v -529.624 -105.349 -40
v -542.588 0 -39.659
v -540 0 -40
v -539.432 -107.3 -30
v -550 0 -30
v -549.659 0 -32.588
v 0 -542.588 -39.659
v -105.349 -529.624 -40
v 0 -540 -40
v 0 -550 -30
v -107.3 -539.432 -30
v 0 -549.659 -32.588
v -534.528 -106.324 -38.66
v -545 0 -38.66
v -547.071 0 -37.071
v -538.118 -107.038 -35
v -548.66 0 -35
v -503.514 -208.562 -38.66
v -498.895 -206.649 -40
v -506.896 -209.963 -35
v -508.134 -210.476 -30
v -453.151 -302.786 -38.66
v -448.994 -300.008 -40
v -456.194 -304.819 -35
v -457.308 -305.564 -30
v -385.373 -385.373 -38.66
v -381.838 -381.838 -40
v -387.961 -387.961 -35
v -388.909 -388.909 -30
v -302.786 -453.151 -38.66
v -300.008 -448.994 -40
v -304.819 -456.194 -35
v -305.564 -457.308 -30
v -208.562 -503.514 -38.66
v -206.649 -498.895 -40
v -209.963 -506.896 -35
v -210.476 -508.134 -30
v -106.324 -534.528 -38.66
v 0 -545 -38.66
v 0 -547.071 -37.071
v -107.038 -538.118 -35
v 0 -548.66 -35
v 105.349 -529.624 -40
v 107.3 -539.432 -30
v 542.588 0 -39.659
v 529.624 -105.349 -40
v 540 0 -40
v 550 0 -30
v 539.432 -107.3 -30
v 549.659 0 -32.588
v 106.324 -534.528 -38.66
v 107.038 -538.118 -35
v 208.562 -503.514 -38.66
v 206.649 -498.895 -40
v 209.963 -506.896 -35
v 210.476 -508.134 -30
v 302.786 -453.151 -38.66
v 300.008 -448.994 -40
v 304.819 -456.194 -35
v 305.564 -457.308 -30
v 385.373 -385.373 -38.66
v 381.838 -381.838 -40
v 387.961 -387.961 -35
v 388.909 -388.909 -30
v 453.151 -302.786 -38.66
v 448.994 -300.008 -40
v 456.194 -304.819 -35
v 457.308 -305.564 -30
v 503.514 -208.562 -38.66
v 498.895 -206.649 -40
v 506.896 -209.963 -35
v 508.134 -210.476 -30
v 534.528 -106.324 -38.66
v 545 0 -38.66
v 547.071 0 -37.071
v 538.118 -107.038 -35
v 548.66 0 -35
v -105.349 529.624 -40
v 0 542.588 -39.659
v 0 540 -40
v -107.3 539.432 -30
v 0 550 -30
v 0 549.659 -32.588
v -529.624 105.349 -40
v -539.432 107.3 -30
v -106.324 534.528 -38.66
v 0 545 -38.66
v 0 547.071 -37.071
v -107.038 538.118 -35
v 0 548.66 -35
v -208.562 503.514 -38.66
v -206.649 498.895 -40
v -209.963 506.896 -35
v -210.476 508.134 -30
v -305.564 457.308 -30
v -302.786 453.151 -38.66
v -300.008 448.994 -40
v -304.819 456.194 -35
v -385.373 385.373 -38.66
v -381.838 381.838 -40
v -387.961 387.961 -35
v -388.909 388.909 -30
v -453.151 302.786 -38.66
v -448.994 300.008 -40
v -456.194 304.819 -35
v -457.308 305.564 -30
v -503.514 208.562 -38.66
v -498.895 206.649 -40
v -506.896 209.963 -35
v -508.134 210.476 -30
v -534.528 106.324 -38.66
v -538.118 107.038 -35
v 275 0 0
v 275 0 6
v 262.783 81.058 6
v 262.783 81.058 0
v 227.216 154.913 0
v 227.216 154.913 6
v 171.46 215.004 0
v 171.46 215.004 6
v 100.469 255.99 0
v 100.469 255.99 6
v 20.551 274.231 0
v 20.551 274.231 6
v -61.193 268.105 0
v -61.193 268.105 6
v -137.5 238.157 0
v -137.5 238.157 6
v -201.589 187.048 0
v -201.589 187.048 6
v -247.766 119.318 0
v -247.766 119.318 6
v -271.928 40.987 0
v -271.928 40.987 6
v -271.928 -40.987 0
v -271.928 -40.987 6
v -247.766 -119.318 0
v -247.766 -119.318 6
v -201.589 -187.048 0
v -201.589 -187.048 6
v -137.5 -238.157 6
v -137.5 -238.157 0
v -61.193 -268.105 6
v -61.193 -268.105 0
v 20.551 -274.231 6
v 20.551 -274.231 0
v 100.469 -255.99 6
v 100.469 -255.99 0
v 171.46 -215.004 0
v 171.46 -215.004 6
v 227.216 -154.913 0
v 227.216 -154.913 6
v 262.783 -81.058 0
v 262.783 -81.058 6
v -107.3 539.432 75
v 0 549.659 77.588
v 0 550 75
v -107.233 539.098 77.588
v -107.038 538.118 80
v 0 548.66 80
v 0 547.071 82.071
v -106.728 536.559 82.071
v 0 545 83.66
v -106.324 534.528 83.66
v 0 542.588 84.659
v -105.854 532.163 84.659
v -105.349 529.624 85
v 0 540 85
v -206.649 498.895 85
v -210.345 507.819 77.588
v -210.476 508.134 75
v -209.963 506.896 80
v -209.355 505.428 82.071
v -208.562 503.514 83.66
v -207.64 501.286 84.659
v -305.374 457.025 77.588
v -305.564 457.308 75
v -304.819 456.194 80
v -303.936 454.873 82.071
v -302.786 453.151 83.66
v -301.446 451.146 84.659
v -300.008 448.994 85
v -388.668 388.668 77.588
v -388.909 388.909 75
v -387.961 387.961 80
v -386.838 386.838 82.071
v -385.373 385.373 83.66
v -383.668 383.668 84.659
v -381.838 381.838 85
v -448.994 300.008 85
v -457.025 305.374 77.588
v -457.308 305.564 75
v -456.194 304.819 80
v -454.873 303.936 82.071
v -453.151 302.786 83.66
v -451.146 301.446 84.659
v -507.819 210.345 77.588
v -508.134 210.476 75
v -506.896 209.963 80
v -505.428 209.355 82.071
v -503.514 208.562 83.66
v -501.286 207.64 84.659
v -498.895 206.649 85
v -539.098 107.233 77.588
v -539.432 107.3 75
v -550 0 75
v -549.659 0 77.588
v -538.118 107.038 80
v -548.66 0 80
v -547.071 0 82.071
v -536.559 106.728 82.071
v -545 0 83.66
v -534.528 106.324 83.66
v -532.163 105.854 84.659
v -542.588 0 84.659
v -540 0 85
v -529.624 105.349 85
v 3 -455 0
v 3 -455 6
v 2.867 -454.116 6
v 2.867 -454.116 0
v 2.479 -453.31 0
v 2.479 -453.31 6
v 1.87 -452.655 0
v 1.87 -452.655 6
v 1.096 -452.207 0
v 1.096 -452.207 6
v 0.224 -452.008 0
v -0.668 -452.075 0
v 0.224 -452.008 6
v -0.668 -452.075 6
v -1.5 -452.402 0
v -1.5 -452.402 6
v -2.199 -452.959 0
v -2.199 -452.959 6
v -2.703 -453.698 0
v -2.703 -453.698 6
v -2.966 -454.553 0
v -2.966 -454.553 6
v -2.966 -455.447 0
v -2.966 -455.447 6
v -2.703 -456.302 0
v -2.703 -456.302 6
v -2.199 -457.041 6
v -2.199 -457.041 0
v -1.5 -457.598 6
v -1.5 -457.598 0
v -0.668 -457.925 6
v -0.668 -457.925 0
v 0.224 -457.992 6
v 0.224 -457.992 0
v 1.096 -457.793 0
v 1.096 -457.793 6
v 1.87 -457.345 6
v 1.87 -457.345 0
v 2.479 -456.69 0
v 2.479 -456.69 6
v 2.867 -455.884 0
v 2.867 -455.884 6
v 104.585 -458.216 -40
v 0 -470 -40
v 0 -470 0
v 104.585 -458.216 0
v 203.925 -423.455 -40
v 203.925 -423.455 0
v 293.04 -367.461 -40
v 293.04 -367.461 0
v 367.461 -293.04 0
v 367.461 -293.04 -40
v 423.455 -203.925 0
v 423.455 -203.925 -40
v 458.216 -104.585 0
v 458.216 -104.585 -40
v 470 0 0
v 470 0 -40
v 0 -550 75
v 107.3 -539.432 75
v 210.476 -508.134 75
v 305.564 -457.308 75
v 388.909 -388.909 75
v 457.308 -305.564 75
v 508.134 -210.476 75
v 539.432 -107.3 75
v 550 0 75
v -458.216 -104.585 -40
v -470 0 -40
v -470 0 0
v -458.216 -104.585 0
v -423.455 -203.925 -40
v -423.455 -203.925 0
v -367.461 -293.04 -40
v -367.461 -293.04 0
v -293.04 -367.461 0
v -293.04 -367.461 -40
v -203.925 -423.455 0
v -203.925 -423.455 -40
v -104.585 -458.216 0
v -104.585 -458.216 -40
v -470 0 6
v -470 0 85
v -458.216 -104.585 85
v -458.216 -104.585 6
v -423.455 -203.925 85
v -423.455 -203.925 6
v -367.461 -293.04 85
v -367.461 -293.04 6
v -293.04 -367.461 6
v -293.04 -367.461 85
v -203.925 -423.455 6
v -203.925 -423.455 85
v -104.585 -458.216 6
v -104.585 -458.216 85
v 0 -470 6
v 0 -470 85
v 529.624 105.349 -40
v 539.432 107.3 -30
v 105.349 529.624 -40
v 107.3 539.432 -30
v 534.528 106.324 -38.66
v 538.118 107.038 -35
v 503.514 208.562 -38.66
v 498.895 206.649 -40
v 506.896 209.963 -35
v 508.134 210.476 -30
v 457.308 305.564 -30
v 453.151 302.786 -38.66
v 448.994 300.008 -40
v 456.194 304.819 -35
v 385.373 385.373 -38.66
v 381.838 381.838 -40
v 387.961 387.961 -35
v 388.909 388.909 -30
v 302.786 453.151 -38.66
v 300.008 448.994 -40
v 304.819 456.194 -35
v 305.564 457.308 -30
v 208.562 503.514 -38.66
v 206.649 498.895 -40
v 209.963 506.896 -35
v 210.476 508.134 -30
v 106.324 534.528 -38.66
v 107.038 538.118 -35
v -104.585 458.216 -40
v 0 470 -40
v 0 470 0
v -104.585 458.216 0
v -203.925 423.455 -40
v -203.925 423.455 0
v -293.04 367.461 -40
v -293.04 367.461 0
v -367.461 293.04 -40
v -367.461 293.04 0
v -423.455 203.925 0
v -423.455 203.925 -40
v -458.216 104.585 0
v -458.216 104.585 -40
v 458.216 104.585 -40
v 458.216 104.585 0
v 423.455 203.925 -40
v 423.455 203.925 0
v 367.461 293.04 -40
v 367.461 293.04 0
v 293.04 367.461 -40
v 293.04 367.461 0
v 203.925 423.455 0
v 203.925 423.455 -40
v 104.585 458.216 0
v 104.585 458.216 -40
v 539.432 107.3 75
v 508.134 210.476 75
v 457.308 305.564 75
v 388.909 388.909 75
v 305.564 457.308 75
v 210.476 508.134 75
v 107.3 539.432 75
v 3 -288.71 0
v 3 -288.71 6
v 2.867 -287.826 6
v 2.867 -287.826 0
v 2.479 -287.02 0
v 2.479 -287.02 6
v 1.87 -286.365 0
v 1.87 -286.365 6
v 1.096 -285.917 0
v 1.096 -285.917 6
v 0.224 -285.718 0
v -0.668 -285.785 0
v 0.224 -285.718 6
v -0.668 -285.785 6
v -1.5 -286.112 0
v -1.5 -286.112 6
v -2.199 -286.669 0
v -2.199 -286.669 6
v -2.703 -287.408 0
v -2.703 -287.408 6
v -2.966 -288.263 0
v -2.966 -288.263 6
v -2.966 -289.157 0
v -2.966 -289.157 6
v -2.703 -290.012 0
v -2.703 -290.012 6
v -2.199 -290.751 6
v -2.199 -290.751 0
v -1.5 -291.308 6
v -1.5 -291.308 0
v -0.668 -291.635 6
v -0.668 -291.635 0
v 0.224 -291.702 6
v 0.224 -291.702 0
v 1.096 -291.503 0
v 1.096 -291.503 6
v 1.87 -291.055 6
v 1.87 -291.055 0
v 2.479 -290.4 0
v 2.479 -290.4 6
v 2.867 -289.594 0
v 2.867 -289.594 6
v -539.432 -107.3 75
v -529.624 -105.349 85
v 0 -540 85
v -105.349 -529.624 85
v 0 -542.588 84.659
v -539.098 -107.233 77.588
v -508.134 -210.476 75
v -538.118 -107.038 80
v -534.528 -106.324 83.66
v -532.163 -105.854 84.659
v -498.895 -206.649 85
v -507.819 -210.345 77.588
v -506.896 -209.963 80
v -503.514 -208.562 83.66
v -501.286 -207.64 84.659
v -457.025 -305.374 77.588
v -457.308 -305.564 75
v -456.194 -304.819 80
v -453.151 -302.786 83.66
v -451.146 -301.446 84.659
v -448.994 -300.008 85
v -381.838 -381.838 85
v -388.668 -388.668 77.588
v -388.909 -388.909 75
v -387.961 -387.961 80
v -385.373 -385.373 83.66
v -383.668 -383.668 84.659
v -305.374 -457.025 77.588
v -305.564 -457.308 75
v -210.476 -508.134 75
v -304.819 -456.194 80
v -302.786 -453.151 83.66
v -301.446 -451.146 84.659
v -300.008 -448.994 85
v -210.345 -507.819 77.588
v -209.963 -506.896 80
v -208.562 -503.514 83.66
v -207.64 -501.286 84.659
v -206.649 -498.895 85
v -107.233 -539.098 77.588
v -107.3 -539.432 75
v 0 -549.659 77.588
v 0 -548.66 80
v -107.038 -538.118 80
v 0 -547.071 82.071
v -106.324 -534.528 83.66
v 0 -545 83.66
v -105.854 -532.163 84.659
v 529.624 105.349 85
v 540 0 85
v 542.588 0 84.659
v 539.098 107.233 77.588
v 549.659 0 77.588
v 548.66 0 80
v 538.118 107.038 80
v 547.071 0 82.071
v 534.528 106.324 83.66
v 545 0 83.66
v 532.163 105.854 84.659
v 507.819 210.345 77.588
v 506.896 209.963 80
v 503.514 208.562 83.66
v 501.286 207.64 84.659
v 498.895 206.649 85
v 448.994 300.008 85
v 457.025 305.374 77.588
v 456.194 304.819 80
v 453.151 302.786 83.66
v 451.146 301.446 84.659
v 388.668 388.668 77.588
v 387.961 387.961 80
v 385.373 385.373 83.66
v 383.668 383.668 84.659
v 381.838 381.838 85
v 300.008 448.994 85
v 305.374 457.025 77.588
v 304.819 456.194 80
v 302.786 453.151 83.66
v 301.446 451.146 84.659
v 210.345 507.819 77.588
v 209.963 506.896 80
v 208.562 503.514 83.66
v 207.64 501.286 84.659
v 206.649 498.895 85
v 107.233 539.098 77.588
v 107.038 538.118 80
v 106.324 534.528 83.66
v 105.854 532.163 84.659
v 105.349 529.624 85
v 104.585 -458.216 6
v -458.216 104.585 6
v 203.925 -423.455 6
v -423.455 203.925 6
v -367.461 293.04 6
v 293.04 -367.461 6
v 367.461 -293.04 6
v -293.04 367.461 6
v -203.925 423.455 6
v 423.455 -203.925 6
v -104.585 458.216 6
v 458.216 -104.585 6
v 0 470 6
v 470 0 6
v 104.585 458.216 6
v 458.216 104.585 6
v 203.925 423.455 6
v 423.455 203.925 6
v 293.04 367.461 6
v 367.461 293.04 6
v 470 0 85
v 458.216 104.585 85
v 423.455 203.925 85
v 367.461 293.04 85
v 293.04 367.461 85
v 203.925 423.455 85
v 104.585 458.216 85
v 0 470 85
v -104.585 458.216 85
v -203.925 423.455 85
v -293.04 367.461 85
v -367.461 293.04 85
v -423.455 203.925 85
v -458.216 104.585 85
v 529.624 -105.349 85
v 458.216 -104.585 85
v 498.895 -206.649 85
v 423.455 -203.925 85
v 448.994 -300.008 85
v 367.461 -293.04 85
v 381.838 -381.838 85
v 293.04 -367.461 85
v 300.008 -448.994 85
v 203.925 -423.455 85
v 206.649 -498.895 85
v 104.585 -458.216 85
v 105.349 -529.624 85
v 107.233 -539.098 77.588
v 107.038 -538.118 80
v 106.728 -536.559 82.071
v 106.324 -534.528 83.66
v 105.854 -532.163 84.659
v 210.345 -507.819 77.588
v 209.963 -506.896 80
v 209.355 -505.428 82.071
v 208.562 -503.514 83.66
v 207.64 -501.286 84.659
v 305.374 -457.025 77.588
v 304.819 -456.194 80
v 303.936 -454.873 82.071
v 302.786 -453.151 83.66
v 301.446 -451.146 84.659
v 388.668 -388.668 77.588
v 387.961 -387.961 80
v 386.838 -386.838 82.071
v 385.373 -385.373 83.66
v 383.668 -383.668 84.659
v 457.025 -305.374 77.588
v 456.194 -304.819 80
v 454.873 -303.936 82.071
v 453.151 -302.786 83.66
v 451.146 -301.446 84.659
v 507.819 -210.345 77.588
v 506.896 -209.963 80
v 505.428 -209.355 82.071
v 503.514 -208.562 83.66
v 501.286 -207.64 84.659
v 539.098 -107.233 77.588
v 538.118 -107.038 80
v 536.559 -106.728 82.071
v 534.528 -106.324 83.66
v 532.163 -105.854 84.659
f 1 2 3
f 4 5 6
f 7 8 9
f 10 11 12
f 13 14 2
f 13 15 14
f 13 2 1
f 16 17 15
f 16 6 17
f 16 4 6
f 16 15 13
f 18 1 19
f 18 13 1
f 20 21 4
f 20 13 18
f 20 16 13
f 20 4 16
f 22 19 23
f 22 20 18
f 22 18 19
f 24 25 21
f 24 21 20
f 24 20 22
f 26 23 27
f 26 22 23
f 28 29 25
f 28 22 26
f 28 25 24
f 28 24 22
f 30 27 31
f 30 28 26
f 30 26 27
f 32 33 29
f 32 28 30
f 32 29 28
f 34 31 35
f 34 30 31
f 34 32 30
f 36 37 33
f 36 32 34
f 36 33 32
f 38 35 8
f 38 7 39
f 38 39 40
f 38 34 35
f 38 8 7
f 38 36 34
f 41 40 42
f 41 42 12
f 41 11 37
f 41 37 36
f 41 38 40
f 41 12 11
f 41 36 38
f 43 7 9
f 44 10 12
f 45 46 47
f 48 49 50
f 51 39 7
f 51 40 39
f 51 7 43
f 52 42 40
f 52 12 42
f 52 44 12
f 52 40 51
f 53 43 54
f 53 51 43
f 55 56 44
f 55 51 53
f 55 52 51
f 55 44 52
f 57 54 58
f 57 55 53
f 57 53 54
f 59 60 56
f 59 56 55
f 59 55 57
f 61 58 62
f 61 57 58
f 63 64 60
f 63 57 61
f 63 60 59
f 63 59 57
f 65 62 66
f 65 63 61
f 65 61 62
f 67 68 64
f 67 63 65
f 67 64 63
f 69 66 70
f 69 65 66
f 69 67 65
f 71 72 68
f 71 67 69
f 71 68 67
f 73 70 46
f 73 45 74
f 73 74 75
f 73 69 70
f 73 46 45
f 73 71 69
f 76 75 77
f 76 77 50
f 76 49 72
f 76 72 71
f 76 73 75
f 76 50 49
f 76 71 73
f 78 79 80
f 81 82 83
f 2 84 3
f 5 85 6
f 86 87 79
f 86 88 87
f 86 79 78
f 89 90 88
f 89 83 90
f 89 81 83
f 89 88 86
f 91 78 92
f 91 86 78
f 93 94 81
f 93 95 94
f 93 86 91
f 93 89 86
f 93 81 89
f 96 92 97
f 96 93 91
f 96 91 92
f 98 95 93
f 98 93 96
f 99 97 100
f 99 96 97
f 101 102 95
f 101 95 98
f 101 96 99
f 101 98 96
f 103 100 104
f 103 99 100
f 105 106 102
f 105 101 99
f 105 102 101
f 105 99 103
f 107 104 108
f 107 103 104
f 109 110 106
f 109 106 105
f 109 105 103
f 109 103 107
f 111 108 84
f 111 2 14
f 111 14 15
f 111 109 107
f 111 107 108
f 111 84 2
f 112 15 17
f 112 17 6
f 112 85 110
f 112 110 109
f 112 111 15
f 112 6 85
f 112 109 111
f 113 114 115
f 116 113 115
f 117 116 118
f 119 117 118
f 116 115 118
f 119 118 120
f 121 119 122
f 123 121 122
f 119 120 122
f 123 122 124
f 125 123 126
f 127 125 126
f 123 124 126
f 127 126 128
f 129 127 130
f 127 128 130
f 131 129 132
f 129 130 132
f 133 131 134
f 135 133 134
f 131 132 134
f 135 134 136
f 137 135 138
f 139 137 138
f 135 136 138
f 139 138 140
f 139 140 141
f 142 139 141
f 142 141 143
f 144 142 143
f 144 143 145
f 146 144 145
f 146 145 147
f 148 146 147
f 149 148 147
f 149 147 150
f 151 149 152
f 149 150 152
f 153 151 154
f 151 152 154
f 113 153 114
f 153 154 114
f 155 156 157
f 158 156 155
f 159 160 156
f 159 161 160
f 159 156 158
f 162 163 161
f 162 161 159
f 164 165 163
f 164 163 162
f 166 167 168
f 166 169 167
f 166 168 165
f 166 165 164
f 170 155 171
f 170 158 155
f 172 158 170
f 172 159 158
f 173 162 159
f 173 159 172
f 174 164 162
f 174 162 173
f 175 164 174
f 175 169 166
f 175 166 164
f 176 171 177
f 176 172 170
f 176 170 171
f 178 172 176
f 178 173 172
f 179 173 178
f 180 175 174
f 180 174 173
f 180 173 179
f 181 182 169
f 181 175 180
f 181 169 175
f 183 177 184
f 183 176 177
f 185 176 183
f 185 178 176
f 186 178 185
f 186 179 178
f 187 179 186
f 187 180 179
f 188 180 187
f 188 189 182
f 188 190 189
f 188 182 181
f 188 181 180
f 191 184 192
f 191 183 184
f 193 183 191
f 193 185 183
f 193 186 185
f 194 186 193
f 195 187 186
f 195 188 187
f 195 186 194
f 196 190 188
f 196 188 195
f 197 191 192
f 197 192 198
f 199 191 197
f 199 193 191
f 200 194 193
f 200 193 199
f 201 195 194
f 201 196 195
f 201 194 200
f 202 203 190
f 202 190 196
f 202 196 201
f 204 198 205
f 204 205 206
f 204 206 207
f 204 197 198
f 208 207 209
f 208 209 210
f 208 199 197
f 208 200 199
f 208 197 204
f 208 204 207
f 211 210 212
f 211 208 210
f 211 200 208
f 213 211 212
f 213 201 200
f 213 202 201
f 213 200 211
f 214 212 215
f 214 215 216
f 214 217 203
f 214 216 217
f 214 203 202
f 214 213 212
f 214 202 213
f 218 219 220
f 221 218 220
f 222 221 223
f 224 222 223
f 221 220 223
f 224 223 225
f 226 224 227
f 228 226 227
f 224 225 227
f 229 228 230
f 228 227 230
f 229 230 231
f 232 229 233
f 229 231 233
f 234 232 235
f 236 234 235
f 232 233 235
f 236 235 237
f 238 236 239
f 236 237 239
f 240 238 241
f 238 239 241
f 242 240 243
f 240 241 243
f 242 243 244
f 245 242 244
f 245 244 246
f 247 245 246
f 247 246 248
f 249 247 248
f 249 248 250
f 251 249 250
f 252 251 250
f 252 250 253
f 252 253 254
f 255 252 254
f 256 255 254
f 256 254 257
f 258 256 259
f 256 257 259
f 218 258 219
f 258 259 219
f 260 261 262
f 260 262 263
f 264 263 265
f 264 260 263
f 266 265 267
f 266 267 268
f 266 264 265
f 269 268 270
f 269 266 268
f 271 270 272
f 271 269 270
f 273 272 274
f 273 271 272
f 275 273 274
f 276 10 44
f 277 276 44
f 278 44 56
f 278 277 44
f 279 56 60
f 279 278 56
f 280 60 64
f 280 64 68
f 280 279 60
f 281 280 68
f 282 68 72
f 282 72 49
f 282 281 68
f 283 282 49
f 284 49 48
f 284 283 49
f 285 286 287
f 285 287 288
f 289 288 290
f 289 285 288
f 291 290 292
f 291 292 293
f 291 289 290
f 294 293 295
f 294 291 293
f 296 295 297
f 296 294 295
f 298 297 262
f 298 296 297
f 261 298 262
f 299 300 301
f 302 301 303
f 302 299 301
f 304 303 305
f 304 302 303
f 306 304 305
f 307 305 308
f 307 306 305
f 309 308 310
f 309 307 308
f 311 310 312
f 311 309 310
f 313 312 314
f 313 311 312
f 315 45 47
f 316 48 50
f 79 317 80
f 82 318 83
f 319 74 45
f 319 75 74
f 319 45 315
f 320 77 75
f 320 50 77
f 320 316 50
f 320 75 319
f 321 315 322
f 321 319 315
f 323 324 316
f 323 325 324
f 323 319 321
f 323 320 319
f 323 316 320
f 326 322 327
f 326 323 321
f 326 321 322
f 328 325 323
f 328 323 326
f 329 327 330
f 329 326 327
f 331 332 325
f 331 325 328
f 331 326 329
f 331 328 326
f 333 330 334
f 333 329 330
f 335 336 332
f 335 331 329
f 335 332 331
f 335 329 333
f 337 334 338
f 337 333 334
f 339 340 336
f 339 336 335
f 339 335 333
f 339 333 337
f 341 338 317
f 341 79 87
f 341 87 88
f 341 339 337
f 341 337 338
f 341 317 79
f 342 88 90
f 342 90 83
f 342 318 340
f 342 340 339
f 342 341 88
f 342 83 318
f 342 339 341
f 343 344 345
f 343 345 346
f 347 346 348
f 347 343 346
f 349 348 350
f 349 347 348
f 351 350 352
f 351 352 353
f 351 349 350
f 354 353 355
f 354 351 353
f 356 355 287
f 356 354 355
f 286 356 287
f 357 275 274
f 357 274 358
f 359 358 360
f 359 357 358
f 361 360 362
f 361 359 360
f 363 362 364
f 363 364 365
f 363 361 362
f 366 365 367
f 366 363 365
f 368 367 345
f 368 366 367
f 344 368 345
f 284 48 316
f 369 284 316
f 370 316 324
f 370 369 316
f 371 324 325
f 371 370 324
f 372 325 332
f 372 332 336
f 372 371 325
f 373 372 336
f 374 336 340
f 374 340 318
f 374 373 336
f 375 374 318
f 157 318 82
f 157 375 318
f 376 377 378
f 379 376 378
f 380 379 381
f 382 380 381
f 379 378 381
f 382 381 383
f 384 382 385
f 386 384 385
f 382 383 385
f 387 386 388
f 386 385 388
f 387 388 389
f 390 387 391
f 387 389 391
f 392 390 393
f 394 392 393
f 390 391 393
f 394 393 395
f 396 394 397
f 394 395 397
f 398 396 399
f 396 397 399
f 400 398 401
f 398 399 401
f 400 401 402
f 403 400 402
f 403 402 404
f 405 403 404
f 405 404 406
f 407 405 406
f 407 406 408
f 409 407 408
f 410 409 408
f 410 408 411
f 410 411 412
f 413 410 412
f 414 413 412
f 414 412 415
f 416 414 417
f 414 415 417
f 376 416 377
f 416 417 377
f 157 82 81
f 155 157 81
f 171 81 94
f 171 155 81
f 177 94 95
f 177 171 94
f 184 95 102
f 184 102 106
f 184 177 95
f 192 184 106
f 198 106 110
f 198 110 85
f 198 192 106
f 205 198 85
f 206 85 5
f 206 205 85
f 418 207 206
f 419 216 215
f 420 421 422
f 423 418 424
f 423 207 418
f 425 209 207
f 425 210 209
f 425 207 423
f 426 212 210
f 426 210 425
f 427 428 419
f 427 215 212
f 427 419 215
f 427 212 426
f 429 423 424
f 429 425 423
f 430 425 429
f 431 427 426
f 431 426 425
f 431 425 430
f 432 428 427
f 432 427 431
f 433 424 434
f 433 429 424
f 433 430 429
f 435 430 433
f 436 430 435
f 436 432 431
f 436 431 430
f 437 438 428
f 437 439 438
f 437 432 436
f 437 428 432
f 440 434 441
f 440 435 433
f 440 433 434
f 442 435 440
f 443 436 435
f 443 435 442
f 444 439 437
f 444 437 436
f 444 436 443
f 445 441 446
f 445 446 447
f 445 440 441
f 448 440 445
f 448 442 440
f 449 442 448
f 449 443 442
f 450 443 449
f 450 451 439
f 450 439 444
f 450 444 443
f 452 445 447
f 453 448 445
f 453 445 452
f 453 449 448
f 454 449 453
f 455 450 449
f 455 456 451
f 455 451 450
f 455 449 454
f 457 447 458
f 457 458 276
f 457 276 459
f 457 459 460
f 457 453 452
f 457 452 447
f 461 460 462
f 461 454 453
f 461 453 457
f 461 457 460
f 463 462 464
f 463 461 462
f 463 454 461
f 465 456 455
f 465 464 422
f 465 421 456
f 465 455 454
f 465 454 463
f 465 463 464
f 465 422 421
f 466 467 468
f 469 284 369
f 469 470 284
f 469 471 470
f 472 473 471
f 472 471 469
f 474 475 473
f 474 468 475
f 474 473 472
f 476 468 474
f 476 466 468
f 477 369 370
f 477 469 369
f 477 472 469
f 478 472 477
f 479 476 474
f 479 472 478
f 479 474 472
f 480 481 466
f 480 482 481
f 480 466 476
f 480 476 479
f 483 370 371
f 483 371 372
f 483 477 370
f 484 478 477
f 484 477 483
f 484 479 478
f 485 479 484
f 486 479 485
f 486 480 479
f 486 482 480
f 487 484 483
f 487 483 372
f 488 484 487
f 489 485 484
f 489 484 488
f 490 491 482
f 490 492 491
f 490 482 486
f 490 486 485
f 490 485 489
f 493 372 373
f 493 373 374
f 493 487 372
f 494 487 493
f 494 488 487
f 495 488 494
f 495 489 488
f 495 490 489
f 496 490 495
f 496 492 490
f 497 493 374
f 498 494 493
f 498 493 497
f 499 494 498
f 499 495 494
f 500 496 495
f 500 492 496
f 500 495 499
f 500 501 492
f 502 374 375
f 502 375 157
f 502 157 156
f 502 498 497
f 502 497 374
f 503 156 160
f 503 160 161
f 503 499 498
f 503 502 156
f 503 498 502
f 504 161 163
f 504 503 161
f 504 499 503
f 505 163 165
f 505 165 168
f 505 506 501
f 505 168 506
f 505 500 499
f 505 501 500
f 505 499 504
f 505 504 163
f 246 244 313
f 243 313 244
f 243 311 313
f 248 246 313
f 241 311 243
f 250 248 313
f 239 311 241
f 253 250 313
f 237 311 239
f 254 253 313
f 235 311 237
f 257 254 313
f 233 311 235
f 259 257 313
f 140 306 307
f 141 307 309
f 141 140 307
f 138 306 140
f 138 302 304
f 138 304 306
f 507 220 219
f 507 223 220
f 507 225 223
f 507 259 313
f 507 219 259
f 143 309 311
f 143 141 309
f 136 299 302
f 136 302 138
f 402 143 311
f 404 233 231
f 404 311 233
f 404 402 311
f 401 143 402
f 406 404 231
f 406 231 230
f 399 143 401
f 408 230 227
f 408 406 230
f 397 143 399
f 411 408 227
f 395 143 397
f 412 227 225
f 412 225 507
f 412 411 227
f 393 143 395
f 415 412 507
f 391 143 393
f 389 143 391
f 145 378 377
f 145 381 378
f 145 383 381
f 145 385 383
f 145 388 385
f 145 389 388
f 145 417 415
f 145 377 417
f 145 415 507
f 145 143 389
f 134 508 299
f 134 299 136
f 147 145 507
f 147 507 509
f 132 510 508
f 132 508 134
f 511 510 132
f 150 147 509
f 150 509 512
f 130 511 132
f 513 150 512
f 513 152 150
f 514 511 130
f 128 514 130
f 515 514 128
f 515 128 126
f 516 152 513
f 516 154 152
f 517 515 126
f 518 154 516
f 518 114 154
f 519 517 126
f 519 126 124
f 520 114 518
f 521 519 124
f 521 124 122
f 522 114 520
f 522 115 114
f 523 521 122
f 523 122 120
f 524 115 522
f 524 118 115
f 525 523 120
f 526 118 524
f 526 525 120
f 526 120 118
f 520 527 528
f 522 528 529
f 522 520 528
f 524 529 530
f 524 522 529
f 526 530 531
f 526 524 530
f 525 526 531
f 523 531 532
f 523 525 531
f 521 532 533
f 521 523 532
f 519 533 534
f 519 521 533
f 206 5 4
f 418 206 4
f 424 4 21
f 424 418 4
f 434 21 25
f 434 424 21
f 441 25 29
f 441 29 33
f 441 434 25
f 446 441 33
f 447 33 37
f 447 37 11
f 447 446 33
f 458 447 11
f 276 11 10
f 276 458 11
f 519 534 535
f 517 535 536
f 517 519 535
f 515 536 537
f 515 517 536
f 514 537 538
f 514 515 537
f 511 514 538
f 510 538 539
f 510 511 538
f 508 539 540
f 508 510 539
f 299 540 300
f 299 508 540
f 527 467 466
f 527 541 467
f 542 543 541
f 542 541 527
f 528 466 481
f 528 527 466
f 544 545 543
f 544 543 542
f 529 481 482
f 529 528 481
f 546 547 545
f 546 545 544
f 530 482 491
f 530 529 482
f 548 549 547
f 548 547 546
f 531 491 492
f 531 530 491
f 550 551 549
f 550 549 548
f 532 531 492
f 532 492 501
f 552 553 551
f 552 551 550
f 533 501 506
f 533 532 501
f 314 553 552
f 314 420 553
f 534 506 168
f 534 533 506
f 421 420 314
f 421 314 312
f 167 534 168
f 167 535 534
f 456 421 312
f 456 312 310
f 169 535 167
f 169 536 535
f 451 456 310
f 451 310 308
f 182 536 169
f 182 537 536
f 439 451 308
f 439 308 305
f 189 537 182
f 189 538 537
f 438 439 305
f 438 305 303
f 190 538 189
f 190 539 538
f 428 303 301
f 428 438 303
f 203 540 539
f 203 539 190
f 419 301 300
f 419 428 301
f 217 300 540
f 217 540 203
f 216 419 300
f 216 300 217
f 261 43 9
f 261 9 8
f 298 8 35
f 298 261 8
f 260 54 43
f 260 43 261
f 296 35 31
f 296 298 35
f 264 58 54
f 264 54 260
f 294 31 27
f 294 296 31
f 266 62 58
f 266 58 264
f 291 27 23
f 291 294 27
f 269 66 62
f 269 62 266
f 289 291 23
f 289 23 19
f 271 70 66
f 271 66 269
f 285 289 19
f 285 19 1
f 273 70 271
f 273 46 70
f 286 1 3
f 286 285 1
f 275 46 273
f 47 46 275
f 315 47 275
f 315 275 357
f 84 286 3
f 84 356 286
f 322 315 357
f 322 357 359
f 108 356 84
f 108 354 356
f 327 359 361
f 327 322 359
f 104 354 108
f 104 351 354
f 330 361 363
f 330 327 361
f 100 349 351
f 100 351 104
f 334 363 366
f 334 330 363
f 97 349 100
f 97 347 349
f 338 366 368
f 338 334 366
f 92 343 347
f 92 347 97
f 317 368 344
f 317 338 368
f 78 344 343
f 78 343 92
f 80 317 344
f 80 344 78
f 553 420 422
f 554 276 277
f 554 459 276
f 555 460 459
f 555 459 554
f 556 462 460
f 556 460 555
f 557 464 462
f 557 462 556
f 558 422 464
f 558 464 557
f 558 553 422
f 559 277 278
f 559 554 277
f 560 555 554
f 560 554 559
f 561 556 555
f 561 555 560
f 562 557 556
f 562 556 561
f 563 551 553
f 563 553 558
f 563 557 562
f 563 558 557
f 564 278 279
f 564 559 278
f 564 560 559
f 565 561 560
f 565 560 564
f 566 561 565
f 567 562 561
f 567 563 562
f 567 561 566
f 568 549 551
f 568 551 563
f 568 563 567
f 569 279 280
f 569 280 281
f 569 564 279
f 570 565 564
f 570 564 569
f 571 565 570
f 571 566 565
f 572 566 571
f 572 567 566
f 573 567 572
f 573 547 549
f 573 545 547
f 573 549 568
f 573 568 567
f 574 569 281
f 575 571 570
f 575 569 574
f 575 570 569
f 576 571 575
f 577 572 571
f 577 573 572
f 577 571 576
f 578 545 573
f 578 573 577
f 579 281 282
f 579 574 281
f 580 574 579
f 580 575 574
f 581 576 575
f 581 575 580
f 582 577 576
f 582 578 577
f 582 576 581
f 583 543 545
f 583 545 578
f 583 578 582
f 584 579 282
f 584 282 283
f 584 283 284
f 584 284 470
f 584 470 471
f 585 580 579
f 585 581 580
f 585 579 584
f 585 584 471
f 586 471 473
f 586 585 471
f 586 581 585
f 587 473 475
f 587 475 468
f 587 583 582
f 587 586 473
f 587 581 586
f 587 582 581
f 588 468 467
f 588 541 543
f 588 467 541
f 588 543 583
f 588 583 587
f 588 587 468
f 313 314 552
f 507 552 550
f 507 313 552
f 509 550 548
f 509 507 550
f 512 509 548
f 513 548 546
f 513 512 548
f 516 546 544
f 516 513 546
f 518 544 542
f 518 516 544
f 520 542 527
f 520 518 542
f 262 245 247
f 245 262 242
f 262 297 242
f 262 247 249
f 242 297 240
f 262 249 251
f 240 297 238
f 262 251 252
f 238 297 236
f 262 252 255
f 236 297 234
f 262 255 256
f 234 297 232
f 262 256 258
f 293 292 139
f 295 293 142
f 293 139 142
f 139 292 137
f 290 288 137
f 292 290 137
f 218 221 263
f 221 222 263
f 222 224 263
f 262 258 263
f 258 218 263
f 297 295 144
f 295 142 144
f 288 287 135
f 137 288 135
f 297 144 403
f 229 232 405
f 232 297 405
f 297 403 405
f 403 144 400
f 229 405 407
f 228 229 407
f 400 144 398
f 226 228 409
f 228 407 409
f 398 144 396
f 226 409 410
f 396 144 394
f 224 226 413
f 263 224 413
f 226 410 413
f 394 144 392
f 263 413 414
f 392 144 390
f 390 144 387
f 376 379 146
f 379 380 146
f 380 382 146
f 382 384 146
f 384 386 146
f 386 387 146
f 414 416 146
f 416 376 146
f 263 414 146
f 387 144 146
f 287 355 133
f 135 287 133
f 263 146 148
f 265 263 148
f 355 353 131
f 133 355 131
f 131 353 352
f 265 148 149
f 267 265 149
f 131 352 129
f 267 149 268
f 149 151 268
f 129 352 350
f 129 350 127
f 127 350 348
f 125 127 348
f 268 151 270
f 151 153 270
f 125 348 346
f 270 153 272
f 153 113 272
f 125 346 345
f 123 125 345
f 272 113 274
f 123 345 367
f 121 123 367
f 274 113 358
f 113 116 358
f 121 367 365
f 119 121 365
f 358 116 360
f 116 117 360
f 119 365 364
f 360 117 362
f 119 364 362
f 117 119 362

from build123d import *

# Parameters (mm, degrees)
ESBO_O1_R                = 470
RESSALTO_EXTRUS_O1_DEPTH = 6
ESBO_O2_R                = 275
CORTE_EXTRUS_O1_DEPTH    = 6
ESBO_O3_R                = 3
CORTE_EXTRUS_O2_DEPTH    = 6


with BuildPart() as part:
    # Esboço1 → Ressalto-extrusão1 (new body)
    with BuildSketch(Plane.XY):
        Circle(ESBO_O1_R)
    extrude(amount=RESSALTO_EXTRUS_O1_DEPTH)

    # Esboço2 → Corte-extrusão1 (cut)
    with BuildSketch(Plane.XY.offset(6)):
        Circle(ESBO_O2_R)
    extrude(amount=-CORTE_EXTRUS_O1_DEPTH, mode=Mode.SUBTRACT)

    # Esboço3 → Corte-extrusão2 (cut)
    with BuildSketch(Plane.XY.offset(6)):
        with Locations((0, -455)):
            Circle(ESBO_O3_R)
        with Locations((0, -288.71)):
            Circle(ESBO_O3_R)
    extrude(amount=-CORTE_EXTRUS_O2_DEPTH, mode=Mode.SUBTRACT)

    # Varredura1: sweep along a curve in space
    with BuildLine() as varredura1_path:
        ThreePointArc((470, 0, 0), (332.340187158, 332.340187158, 0), (0, 470, 0))
        ThreePointArc((0, 470, 0), (-332.340187158, 332.340187158, 0), (-470, 0, 0))
        ThreePointArc((-470, 0, 0), (-332.340187158, -332.340187158, 0), (0, -470, 0))
        ThreePointArc((0, -470, 0), (332.340187158, -332.340187158, 0), (470, 0, 0))
    # Esboço4 → Varredura1 (sweep)
    with BuildSketch(Plane(origin=(0, 0, 0), x_dir=(1, 0, 0), z_dir=(0, 1, 0))):
        with BuildLine():
            Line((-470, 0), (-470, 40))
            Line((-470, 40), (-540, 40))
            ThreePointArc((-540, 40), (-547.071067812, 37.071067812), (-550, 30))
            Line((-550, 30), (-550, -75))
            ThreePointArc((-550, -75), (-547.071067812, -82.071067812), (-540, -85))
            Line((-540, -85), (-470, -85))
            Line((-470, -85), (-470, 0))
        make_face()
    sweep(path=varredura1_path.line)


solid = part.part
